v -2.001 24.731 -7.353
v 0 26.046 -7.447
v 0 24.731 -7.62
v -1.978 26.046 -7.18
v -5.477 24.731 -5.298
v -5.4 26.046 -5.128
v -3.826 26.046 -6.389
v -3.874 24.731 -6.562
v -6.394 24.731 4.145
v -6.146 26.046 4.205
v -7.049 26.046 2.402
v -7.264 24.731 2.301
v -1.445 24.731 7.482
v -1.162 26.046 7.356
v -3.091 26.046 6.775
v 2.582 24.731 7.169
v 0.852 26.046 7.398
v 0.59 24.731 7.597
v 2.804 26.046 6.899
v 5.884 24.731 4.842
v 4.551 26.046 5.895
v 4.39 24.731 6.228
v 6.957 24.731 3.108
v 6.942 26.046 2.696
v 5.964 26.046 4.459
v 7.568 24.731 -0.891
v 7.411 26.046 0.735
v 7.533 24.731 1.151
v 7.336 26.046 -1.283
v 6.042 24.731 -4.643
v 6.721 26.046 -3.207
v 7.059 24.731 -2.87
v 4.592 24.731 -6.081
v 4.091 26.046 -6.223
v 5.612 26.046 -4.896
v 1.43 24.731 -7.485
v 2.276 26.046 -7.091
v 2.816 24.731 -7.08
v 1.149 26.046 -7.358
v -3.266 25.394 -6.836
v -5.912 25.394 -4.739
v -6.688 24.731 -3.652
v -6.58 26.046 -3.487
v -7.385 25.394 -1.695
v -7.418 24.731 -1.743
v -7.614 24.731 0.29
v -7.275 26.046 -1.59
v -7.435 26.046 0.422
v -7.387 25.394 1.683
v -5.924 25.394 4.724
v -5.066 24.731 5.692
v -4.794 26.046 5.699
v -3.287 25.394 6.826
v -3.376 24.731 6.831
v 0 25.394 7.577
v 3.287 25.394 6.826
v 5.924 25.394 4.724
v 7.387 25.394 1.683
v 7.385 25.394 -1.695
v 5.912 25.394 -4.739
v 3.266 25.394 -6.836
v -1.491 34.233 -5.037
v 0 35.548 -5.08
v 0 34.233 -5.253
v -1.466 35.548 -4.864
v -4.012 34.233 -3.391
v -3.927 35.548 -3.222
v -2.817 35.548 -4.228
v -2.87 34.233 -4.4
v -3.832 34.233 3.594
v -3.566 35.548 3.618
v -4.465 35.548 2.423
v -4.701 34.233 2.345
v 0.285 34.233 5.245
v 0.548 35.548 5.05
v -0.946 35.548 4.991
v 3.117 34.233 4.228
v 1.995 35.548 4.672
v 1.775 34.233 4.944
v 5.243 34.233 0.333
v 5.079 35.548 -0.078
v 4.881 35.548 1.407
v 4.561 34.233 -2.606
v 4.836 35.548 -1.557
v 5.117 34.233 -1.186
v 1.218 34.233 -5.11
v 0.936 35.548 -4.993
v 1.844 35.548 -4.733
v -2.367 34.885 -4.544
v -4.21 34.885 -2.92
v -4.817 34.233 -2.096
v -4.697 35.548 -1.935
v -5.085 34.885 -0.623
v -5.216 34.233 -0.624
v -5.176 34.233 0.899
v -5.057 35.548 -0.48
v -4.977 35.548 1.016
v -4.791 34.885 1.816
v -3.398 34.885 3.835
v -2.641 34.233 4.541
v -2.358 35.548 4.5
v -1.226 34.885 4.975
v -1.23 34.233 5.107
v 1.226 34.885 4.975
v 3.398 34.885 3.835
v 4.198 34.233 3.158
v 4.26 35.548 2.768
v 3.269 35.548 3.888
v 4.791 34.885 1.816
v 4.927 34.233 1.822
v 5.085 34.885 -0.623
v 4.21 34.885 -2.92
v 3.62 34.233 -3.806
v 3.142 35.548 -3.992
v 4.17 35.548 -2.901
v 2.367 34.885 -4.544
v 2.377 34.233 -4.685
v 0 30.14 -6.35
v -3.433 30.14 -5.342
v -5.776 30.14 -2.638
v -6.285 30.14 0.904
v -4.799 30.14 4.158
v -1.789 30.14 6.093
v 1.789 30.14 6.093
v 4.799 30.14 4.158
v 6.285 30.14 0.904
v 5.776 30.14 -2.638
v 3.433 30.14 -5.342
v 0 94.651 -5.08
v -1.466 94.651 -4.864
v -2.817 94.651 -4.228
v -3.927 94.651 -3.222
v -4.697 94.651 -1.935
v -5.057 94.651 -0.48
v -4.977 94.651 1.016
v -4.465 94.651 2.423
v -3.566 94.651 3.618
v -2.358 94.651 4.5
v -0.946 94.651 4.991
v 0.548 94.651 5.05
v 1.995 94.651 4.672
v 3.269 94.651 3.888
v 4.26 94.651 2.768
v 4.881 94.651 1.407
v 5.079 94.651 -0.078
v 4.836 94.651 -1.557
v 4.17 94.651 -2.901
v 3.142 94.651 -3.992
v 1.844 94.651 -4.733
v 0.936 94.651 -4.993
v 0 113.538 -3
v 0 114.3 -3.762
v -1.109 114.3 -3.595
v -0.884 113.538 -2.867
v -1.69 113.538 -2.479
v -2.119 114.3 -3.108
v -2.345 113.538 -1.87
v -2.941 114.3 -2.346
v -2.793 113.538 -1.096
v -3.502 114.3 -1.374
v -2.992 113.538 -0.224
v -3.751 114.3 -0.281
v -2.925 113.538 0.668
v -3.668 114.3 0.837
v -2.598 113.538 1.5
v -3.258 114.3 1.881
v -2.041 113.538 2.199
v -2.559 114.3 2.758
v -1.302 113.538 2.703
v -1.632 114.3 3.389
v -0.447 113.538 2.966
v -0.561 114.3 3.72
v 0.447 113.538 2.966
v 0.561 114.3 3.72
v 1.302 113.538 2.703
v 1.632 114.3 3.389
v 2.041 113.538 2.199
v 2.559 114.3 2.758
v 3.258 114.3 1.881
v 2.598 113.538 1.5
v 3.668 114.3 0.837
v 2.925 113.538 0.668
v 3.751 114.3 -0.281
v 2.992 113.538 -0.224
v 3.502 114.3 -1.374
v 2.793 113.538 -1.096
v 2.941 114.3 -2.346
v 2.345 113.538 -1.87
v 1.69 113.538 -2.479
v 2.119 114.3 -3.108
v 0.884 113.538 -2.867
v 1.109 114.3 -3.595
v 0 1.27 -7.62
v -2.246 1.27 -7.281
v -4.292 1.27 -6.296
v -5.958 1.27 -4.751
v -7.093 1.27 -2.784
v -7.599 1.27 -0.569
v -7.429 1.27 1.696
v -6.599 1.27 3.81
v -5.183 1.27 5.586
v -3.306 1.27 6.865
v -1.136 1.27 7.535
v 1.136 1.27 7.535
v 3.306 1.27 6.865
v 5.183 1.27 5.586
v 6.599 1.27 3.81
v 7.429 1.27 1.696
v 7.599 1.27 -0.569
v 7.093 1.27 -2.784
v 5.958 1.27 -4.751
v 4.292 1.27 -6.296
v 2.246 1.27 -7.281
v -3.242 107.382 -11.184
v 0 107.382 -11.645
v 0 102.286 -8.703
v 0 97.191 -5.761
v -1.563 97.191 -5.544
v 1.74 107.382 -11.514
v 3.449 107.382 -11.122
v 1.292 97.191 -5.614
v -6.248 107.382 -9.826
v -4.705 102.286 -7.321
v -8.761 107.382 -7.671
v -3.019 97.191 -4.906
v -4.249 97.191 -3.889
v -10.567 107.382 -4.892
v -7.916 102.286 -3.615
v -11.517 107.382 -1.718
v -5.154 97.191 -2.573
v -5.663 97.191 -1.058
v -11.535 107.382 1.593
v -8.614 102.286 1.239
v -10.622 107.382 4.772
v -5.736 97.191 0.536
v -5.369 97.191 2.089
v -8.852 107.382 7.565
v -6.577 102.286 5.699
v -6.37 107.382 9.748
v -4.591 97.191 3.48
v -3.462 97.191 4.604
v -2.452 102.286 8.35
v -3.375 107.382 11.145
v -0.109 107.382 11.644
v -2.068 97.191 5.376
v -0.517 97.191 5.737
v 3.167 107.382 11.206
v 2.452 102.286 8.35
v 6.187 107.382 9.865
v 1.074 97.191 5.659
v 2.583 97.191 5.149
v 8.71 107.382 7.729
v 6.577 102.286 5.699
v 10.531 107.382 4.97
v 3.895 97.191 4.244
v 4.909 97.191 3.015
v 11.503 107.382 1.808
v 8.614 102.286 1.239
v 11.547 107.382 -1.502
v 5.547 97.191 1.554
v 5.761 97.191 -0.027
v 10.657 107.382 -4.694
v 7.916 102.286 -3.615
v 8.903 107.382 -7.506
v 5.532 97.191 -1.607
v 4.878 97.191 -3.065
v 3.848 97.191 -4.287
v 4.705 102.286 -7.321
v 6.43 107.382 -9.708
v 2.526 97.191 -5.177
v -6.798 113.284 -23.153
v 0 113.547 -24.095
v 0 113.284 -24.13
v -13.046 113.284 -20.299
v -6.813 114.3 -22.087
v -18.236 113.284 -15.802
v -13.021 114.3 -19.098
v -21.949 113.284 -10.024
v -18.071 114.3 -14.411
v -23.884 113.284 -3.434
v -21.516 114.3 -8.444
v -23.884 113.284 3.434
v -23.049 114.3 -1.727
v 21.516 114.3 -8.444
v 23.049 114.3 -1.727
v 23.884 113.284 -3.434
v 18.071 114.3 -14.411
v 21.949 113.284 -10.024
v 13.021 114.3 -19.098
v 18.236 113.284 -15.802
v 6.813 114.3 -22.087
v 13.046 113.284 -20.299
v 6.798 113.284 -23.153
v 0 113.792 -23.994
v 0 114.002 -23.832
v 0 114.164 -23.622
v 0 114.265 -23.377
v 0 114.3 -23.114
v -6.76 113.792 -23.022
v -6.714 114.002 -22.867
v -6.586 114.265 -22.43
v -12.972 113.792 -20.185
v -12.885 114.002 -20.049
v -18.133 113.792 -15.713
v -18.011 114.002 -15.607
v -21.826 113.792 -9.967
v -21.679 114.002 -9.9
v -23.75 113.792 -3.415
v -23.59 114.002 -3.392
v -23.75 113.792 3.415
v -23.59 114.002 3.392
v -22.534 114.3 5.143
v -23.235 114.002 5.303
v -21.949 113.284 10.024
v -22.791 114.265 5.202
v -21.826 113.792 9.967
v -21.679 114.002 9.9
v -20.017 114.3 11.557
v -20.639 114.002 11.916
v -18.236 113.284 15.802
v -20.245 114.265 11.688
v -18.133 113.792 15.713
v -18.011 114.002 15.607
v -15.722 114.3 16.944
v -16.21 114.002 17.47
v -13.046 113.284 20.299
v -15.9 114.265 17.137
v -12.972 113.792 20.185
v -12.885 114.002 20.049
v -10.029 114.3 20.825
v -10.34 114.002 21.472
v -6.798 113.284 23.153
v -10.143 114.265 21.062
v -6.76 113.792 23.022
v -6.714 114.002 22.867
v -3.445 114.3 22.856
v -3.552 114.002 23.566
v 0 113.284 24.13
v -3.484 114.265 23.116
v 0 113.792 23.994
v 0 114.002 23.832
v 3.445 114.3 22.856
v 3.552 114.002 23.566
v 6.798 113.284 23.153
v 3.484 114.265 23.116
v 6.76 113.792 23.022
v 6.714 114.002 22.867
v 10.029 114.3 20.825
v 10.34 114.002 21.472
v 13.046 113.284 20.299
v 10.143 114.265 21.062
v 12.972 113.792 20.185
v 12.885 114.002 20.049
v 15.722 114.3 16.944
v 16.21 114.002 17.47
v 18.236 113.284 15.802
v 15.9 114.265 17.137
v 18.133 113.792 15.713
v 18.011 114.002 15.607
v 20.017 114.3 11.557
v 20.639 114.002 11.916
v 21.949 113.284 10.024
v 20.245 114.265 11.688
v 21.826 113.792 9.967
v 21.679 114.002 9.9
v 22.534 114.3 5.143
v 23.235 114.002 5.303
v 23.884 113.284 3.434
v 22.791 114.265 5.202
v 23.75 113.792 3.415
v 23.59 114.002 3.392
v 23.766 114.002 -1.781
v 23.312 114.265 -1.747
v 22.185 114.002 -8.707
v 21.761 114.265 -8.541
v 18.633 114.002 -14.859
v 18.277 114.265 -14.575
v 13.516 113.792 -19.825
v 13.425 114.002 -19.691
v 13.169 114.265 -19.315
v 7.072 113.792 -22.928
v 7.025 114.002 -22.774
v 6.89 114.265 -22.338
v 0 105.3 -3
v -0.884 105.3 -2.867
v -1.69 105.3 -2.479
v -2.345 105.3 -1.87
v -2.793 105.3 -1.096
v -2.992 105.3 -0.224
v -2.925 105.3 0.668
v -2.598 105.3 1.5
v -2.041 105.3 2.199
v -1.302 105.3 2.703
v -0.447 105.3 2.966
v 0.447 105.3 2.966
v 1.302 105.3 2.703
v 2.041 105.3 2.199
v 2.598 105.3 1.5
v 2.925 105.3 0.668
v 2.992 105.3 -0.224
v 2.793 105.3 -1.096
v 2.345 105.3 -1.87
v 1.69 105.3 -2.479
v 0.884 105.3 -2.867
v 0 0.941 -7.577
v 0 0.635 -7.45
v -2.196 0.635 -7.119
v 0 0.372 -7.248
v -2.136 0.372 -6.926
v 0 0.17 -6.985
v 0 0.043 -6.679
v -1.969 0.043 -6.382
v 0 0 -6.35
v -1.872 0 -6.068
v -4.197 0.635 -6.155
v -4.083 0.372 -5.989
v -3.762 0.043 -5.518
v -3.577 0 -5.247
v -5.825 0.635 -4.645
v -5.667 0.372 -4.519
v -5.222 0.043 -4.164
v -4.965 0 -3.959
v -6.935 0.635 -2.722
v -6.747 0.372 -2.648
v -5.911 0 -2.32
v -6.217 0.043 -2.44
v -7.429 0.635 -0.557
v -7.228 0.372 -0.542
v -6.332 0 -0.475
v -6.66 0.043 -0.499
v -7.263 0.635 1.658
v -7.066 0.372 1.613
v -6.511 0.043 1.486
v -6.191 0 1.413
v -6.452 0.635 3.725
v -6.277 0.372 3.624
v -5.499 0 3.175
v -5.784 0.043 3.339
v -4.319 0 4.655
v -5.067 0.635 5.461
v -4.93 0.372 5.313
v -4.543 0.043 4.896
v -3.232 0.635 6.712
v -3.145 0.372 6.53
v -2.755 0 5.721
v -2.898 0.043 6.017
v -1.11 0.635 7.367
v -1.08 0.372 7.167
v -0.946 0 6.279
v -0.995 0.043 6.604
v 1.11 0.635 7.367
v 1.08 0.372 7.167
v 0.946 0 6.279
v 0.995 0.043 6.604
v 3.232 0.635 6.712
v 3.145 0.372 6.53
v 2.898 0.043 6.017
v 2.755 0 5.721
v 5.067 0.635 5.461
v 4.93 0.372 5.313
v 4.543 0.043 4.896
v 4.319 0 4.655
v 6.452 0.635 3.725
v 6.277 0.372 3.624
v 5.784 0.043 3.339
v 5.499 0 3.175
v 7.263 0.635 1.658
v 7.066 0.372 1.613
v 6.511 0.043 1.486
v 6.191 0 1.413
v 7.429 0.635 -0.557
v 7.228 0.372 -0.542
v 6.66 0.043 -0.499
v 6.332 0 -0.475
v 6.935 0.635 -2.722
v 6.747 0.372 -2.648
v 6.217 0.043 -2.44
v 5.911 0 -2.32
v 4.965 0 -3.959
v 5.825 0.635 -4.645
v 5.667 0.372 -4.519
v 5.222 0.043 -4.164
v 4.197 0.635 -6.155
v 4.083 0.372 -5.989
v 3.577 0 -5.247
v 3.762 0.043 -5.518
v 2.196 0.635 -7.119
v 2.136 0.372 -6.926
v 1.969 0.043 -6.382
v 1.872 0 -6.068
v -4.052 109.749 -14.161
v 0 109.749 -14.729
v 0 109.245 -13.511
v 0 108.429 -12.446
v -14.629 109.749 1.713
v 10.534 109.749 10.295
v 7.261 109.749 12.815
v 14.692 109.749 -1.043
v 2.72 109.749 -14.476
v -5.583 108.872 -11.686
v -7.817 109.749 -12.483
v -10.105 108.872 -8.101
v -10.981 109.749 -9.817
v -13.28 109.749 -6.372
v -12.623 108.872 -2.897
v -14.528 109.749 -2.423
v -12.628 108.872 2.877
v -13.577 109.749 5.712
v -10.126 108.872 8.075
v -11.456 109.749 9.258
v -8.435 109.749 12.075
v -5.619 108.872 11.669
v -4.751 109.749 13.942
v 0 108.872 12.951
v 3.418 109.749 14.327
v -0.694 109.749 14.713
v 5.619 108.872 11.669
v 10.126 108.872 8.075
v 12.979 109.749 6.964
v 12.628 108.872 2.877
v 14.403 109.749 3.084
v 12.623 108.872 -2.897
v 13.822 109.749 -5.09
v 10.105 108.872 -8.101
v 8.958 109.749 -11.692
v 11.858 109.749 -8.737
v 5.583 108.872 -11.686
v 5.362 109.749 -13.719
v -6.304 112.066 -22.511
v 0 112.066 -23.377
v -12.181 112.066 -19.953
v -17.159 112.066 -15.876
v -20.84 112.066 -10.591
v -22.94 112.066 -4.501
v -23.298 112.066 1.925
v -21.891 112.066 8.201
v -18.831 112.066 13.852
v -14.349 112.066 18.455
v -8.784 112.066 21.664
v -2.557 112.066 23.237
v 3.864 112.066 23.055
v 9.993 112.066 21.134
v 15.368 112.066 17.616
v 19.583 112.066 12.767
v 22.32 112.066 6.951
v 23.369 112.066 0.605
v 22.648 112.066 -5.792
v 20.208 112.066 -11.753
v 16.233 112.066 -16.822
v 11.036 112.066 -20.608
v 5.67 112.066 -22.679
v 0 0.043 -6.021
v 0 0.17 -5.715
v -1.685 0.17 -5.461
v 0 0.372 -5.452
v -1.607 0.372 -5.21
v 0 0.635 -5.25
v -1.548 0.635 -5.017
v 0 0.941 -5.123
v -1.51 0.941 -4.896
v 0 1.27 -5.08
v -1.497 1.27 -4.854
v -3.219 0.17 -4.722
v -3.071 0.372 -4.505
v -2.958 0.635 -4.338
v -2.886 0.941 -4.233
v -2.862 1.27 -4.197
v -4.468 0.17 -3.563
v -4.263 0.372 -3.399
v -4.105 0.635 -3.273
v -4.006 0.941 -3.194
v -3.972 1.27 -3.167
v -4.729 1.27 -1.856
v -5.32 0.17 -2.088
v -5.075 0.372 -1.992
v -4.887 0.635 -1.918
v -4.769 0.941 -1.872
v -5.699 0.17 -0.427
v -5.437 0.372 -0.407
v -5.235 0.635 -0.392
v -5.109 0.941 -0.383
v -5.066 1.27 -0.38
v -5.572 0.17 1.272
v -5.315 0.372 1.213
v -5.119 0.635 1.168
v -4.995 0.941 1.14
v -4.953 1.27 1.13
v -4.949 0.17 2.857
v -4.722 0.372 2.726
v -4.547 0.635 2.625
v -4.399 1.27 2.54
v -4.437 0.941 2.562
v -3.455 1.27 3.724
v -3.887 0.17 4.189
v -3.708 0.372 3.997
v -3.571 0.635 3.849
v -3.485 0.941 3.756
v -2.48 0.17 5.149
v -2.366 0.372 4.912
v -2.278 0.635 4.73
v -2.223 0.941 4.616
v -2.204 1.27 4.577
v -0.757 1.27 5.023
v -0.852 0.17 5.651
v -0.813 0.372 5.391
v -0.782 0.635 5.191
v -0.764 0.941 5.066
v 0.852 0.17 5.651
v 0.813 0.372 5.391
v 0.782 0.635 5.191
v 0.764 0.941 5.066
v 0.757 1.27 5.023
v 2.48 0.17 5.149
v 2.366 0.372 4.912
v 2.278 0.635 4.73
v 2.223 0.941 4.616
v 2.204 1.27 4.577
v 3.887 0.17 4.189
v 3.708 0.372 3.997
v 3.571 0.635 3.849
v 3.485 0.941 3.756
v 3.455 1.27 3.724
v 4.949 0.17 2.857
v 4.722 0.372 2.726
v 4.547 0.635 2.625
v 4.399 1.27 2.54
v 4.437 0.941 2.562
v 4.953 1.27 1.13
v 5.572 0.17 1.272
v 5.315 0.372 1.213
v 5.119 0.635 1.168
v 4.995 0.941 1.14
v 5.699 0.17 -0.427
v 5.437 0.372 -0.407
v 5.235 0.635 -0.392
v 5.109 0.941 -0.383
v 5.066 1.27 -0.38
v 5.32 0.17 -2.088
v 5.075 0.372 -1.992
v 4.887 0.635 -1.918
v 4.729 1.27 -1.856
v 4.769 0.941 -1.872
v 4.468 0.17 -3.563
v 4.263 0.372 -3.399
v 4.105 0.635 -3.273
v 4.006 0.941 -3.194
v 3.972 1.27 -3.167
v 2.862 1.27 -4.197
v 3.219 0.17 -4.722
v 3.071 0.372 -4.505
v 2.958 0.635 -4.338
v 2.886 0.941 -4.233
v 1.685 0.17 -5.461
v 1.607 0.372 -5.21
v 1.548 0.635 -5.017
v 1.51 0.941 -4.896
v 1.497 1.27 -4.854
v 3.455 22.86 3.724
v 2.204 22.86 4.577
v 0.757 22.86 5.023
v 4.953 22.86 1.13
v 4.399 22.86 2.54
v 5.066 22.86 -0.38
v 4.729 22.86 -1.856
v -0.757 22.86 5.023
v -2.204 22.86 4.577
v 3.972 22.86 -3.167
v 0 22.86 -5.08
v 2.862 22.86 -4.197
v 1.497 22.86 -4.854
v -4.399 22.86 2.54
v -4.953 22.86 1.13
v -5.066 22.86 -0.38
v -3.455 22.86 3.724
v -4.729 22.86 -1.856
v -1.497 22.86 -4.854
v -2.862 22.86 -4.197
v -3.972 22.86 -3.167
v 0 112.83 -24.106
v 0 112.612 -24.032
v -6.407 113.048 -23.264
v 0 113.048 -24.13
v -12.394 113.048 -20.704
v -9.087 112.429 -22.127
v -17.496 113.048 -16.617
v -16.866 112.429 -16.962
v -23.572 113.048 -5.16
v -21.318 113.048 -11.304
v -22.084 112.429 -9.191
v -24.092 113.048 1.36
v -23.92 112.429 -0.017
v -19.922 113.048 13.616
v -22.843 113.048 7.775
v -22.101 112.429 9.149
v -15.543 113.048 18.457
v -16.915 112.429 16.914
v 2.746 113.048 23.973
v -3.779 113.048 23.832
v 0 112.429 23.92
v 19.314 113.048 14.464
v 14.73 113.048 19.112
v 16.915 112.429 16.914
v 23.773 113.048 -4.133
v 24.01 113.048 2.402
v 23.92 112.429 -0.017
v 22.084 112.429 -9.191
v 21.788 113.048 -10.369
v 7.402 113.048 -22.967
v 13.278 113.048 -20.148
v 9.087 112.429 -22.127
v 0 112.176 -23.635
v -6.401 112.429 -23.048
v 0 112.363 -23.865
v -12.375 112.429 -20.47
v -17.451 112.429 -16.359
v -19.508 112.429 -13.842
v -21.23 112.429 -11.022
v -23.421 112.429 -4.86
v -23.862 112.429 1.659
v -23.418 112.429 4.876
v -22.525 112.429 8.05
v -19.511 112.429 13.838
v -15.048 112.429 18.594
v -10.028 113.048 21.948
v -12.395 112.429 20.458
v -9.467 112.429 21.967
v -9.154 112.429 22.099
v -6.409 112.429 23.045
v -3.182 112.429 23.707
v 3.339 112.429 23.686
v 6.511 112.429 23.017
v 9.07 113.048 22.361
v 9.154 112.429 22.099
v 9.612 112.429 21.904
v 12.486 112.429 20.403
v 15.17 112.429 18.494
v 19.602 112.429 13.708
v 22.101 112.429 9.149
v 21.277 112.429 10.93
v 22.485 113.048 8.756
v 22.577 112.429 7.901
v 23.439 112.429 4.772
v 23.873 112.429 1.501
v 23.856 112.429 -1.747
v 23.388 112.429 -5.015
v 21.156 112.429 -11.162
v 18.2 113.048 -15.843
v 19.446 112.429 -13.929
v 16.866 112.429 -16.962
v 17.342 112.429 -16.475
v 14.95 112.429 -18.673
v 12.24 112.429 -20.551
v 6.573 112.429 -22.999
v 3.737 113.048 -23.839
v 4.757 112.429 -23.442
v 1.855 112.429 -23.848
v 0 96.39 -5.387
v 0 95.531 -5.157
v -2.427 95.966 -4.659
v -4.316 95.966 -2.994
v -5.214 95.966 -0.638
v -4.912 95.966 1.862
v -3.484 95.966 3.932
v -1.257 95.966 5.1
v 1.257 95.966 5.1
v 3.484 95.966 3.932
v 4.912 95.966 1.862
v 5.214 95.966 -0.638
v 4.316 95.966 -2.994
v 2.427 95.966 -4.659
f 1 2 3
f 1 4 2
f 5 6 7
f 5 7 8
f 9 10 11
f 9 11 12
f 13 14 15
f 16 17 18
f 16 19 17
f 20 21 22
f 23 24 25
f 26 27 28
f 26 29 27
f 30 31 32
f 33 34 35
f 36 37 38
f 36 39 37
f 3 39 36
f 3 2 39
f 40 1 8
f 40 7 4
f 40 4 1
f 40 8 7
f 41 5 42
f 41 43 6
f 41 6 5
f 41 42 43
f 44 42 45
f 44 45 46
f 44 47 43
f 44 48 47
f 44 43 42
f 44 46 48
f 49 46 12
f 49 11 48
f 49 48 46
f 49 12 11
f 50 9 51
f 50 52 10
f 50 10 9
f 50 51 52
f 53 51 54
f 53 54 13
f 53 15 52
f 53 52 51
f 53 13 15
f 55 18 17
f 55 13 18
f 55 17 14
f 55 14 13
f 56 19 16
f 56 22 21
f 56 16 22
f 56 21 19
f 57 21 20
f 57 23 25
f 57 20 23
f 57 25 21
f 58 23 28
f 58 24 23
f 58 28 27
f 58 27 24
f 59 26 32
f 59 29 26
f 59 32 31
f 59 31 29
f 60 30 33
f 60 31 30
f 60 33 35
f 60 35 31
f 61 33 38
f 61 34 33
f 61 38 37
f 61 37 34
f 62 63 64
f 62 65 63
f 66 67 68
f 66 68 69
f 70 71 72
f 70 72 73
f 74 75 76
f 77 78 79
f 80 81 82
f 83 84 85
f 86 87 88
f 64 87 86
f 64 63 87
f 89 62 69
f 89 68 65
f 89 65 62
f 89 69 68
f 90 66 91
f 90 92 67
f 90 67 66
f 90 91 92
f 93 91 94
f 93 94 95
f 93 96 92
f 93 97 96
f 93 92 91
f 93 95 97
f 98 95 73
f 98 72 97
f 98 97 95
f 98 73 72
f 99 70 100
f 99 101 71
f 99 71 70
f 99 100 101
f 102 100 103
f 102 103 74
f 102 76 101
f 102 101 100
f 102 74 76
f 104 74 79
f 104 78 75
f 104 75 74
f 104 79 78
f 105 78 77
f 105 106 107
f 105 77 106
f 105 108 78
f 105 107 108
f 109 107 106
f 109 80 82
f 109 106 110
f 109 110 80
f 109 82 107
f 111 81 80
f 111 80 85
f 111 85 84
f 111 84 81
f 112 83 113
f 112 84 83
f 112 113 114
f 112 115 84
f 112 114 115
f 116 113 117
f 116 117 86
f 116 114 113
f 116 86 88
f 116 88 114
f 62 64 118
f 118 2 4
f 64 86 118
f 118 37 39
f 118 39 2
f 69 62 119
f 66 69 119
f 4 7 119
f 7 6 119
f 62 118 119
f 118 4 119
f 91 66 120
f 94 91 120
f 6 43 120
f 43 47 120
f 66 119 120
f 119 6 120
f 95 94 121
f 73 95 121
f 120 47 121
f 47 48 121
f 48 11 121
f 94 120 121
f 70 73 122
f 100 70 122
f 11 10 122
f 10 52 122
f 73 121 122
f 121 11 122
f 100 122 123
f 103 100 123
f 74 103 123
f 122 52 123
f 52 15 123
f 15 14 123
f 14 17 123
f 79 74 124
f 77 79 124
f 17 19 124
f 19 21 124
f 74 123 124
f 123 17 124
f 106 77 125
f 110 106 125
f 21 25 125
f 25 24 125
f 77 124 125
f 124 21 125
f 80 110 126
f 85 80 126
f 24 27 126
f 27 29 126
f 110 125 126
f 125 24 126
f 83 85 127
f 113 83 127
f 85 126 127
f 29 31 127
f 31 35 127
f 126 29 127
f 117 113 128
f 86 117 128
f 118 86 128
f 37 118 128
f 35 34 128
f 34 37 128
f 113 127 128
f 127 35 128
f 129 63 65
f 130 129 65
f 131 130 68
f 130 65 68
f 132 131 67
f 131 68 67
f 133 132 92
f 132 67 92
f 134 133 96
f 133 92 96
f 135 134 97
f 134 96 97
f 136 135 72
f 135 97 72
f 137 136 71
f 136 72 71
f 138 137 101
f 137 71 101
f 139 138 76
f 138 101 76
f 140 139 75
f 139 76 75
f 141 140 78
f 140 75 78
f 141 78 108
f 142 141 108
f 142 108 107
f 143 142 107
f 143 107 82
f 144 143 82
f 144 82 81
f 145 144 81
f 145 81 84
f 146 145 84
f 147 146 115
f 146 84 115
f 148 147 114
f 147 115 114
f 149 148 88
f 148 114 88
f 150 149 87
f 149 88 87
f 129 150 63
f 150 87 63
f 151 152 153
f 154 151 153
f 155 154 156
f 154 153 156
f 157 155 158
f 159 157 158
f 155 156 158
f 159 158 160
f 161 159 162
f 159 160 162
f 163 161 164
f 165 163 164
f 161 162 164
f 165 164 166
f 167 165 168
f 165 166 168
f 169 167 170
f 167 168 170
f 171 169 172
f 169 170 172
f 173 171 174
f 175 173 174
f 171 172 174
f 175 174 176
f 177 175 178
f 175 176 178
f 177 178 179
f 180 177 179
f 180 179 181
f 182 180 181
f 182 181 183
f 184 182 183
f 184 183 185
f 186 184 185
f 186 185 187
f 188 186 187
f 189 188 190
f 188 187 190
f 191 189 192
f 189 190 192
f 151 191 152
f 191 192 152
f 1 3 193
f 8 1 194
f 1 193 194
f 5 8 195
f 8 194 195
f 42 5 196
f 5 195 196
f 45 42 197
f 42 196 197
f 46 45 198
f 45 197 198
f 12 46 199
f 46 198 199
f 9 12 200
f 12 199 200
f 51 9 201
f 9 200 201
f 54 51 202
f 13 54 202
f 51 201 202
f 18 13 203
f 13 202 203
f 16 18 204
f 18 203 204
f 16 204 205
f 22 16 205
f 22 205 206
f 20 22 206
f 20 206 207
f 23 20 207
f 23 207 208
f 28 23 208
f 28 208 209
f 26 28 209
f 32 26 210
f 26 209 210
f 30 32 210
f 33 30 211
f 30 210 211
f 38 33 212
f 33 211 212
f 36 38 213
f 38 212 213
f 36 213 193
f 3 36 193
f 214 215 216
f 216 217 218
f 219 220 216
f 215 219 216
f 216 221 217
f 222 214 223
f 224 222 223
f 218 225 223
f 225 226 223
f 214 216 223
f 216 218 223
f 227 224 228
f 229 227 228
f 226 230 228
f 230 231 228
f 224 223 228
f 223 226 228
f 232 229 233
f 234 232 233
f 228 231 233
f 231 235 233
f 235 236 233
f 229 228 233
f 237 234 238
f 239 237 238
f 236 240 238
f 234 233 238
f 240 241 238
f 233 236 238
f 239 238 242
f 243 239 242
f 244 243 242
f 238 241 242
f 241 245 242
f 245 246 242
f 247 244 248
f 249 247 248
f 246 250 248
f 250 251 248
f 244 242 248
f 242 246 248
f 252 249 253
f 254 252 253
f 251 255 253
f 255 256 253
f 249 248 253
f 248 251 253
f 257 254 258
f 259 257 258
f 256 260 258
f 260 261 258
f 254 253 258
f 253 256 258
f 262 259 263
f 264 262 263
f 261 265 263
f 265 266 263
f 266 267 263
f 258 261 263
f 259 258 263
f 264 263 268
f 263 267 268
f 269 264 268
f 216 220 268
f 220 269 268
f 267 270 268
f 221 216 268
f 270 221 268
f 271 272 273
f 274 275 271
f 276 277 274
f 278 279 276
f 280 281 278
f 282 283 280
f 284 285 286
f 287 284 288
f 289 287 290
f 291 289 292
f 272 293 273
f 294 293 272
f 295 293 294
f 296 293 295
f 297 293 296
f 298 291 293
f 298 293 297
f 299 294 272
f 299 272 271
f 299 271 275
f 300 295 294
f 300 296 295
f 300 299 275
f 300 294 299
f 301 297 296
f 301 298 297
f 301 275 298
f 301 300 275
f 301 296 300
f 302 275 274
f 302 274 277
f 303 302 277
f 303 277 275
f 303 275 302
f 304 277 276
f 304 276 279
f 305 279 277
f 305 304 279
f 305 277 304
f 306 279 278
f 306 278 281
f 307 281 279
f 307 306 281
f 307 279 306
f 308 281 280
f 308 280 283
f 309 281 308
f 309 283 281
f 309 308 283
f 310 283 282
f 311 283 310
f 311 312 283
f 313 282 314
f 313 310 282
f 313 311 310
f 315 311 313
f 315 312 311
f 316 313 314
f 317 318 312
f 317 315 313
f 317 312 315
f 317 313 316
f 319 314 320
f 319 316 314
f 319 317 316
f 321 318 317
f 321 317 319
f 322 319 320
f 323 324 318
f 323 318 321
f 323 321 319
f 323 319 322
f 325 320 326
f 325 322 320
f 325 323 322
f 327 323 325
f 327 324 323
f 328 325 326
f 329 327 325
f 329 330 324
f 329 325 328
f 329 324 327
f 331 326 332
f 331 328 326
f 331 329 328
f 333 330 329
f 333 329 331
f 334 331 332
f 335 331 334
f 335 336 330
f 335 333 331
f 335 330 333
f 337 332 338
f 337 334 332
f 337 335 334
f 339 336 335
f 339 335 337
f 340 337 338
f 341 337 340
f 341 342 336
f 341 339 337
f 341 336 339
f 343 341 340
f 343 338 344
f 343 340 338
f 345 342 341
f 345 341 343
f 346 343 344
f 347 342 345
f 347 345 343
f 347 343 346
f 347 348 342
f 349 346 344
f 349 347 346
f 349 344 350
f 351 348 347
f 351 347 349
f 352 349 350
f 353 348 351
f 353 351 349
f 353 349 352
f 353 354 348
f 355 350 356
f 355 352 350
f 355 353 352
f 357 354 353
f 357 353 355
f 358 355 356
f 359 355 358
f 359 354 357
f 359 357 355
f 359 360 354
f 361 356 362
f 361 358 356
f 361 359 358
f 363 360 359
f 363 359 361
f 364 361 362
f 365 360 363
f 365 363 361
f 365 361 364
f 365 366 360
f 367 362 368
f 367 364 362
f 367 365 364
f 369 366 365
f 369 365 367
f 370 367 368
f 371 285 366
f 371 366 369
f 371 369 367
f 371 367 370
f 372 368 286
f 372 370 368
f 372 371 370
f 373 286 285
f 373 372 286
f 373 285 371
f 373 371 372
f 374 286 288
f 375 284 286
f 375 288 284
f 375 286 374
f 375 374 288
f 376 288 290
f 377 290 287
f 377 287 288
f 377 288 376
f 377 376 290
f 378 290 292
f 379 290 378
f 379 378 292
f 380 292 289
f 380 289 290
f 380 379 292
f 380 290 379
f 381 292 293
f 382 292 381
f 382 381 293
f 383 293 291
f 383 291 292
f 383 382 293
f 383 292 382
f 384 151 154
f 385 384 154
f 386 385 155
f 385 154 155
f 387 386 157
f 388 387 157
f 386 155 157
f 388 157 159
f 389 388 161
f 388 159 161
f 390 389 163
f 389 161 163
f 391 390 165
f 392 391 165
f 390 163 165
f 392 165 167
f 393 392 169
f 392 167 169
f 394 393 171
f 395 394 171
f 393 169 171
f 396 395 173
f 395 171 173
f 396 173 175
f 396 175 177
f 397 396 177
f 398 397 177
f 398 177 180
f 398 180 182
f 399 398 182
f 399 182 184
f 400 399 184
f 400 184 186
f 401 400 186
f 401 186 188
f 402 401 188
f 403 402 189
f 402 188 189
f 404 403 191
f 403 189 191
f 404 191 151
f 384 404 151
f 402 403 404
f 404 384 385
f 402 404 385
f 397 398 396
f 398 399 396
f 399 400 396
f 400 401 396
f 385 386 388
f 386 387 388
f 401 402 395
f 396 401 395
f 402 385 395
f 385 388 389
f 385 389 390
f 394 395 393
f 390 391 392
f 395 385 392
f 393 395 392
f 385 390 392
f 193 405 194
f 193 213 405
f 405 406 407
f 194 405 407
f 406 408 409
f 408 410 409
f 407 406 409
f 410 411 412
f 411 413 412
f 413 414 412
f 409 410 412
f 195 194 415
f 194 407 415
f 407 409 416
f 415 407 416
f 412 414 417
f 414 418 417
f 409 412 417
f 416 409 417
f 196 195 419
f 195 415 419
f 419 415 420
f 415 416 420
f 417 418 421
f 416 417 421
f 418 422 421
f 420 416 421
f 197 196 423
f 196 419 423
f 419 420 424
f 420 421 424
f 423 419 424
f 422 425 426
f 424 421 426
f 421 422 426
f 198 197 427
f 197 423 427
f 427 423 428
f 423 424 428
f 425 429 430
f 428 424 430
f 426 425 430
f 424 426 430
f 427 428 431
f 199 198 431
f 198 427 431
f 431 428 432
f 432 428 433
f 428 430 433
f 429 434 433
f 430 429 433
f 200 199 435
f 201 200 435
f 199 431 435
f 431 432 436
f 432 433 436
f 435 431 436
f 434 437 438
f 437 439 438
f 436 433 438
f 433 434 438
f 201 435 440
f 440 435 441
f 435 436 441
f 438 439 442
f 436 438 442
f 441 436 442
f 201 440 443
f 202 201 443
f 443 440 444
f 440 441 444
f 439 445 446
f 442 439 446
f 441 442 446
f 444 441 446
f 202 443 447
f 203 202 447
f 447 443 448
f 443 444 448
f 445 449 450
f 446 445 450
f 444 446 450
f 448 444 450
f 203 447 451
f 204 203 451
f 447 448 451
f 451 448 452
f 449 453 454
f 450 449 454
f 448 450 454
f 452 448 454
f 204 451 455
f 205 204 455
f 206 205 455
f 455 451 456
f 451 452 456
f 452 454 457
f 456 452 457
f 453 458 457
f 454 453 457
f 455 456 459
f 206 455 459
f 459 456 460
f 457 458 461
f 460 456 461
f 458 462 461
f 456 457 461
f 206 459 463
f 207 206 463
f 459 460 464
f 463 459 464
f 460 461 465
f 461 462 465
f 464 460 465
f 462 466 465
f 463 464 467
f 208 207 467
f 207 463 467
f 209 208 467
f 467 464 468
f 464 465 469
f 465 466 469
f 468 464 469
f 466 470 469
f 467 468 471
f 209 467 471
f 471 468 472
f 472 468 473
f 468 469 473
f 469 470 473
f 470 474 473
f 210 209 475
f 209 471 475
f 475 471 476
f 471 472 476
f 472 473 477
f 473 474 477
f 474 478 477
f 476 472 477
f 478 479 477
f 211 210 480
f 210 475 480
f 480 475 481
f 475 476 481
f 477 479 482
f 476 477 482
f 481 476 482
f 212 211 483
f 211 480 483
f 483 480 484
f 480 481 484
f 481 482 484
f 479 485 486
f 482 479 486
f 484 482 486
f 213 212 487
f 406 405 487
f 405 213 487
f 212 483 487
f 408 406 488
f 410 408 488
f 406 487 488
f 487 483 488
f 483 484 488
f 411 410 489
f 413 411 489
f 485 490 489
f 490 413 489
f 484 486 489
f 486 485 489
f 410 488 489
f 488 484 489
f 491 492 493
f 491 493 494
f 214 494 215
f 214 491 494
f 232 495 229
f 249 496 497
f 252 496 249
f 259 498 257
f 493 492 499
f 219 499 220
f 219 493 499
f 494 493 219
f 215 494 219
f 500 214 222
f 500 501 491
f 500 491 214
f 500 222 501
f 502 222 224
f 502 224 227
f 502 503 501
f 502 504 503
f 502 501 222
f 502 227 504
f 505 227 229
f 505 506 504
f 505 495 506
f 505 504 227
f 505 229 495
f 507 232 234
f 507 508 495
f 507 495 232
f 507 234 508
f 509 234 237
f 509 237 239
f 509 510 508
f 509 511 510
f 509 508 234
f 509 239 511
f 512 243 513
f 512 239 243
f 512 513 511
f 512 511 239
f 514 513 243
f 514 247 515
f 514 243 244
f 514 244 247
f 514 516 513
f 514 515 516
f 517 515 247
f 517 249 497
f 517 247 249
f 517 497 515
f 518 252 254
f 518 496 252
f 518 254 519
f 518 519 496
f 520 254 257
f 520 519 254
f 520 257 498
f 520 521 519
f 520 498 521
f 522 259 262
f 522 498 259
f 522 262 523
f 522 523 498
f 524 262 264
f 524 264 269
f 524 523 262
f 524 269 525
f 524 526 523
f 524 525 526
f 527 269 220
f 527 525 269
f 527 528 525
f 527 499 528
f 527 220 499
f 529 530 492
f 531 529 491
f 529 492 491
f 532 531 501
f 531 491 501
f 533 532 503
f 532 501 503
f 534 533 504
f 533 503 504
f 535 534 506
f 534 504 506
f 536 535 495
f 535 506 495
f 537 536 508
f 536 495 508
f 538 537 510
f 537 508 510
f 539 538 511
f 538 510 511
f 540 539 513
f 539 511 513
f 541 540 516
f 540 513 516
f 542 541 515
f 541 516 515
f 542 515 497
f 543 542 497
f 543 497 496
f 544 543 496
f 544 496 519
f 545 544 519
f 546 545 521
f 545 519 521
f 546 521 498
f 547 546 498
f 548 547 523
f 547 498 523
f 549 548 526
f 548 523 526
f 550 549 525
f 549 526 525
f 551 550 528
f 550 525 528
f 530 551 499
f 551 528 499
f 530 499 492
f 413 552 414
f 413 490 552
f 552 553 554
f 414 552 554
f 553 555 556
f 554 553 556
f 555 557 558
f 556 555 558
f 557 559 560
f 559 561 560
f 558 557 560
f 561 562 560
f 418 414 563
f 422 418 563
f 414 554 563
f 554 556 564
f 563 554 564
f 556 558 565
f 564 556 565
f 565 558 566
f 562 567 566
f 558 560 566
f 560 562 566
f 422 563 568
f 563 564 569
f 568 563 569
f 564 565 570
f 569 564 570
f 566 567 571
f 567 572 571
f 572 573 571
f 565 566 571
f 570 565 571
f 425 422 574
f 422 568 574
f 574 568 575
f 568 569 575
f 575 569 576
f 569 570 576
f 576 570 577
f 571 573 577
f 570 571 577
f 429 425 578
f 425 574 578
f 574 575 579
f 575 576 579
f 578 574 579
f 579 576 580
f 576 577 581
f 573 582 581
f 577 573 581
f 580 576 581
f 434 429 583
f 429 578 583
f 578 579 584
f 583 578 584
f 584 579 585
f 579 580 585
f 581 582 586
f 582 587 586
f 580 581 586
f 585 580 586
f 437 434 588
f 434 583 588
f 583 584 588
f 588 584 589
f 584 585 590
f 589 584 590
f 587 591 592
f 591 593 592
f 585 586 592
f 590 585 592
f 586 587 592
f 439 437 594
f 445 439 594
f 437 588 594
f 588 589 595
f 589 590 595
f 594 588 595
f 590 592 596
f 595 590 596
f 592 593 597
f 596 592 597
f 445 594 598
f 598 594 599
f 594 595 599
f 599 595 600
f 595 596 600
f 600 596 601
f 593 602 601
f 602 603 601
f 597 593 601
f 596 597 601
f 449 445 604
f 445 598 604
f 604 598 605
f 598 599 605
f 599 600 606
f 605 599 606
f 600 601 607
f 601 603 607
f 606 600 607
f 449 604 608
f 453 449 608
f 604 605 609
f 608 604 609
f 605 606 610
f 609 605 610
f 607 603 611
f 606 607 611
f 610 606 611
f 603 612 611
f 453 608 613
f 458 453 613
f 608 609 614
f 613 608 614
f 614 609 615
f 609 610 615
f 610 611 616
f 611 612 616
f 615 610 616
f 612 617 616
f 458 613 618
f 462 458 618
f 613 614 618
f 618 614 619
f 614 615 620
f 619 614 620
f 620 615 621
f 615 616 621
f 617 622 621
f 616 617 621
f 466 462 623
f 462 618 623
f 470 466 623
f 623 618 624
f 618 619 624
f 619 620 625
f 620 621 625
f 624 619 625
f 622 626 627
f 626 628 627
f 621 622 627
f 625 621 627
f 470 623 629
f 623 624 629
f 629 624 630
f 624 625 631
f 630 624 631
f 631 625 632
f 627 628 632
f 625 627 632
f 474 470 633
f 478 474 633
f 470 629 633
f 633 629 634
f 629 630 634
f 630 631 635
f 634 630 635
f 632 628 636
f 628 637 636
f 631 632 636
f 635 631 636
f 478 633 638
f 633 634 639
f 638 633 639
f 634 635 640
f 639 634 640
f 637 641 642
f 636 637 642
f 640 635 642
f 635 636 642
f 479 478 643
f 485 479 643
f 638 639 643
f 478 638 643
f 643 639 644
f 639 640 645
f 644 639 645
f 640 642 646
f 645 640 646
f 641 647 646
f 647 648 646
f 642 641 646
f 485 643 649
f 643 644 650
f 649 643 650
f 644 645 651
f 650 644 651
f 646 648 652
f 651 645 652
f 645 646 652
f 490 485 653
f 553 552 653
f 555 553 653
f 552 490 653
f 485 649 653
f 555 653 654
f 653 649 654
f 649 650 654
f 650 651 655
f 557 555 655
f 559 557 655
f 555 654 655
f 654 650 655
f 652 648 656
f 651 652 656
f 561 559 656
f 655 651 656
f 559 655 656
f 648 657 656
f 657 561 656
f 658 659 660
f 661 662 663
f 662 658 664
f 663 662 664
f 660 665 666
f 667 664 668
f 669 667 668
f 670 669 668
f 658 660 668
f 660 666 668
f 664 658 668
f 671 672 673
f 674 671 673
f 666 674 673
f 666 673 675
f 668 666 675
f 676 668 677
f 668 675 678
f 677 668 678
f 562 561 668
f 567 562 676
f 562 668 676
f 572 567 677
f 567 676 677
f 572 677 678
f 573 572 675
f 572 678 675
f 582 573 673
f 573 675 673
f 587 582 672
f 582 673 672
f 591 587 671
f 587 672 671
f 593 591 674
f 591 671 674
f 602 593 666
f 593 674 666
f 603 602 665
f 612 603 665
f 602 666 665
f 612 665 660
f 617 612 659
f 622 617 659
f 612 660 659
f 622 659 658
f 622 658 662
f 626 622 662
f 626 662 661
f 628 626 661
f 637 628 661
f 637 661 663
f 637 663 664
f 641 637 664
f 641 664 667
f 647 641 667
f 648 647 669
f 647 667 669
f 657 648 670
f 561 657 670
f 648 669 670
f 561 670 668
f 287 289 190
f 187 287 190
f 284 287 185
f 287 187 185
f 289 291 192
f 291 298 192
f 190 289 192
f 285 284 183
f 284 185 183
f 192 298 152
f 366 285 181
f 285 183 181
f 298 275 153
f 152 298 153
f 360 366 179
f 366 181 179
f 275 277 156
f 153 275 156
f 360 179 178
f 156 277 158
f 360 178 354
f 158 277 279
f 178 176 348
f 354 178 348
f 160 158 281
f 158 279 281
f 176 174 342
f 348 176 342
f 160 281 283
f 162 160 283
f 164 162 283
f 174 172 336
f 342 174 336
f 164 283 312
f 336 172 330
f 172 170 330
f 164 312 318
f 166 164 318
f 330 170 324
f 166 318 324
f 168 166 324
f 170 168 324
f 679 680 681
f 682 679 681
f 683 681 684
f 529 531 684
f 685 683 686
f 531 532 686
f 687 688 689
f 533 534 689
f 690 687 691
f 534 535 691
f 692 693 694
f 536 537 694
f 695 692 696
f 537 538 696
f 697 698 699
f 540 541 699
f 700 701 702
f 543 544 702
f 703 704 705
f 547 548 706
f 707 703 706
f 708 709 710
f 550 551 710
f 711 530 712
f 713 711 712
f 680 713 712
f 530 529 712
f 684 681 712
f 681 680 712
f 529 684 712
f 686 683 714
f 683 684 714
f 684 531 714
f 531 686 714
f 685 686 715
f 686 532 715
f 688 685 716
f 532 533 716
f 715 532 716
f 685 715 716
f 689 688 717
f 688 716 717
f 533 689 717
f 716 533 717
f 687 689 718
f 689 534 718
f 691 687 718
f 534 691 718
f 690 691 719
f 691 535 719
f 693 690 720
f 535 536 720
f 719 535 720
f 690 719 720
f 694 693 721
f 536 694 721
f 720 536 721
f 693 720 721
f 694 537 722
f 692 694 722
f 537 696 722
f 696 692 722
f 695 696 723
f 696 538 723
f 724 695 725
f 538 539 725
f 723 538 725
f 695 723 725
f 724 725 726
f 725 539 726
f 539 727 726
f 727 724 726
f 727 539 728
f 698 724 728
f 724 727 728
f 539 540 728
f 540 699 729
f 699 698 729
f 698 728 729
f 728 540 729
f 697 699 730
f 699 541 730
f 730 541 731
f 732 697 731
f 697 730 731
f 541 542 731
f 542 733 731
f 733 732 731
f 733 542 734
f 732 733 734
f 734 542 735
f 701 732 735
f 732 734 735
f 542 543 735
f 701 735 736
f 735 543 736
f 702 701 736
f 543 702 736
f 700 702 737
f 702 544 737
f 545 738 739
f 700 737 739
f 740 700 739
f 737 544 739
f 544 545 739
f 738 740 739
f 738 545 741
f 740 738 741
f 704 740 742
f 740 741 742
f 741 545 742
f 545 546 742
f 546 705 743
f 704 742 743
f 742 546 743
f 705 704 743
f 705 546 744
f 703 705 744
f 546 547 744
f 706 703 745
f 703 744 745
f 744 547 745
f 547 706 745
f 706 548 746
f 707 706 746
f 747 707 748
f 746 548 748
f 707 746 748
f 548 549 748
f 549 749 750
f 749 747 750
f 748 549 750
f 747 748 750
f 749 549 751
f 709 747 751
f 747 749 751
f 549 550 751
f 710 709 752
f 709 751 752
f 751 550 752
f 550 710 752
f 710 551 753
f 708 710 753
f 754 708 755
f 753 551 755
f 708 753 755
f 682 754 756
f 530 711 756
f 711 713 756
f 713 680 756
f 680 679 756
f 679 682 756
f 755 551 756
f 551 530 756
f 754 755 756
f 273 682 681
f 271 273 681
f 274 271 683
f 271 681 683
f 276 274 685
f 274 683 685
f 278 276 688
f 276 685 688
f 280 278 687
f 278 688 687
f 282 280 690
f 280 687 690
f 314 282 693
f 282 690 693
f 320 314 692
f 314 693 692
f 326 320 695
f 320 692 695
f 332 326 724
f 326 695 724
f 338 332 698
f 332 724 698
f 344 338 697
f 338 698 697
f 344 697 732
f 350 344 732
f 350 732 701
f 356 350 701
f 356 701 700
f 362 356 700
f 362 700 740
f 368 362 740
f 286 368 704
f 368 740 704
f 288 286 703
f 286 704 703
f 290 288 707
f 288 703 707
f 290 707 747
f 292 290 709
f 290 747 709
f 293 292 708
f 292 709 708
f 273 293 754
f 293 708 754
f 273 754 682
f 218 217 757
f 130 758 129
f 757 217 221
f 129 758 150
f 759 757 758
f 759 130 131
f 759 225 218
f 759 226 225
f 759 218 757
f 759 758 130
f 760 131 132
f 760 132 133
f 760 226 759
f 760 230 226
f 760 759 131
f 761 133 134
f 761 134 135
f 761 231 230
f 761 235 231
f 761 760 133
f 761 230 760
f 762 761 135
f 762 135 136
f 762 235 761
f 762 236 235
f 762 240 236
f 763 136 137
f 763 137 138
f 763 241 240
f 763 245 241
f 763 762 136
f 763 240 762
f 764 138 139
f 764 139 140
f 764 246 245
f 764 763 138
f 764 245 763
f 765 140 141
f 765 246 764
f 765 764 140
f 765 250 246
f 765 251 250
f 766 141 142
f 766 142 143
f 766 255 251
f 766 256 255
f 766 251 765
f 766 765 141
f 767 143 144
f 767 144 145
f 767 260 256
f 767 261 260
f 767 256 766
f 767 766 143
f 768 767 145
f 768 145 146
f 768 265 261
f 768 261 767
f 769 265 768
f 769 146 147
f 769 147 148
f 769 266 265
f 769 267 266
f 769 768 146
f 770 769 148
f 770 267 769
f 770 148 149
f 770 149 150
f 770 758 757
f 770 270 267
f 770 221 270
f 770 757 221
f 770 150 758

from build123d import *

# Parameters (mm, degrees)
CHAMFER1_SIZE = 0.762
FILLET1_R     = 1.27
FILLET2_R     = 1.016
FILLET3_R     = 5.08


with BuildPart() as part:
    # Sketch1 → Revolve1 (revolve)
    with BuildSketch(Plane.XY, mode=Mode.PRIVATE) as revolve1_sk:
        Polygon((-5.08, 96.012), (-5.08, 34.879409051), (-7.62, 25.4), (-7.62, 0), (-5.08, 0), (-5.08, 22.86), (0, 22.86), (0, 105.3), (-3, 105.3), (-3, 114.3), (-24.13, 114.3), (-24.13, 112.268), (-12.696662511, 109.204446453), align=None)
    revolve(revolve1_sk.sketch.rotate(Axis((0, 22.86, 0), (0, 1, 0)), 270), axis=Axis((0, 22.86, 0), (0, 1, 0)))

    # Chamfer1
    chamfer1_edges = [part.edges().sort_by_distance(p)[0] for p in [
        (0, 114.3, 3),
    ]]
    chamfer(chamfer1_edges, length=CHAMFER1_SIZE)

    # Fillet1
    fillet1_edges = [part.edges().sort_by_distance(p)[0] for p in [
        (0, 0, 5.08),
        (0, 0, 7.62),
    ]]
    fillet(fillet1_edges, radius=FILLET1_R - 0.0001)  # a hair under: the kernel refuses the full size

    # Fillet2
    fillet2_edges = [part.edges().sort_by_distance(p)[0] for p in [
        (0, 112.268, 24.13),
        (0, 114.3, 24.13),
    ]]
    fillet(fillet2_edges, radius=FILLET2_R)

    # Fillet3
    fillet3_edges = [part.edges().sort_by_distance(p)[0] for p in [
        (0, 109.204446453, 12.696662511),
        (0, 25.4, 7.62),
        (0, 34.879409051, 5.08),
        (0, 96.012, 5.08),
    ]]
    fillet(fillet3_edges, radius=FILLET3_R)


solid = part.part
